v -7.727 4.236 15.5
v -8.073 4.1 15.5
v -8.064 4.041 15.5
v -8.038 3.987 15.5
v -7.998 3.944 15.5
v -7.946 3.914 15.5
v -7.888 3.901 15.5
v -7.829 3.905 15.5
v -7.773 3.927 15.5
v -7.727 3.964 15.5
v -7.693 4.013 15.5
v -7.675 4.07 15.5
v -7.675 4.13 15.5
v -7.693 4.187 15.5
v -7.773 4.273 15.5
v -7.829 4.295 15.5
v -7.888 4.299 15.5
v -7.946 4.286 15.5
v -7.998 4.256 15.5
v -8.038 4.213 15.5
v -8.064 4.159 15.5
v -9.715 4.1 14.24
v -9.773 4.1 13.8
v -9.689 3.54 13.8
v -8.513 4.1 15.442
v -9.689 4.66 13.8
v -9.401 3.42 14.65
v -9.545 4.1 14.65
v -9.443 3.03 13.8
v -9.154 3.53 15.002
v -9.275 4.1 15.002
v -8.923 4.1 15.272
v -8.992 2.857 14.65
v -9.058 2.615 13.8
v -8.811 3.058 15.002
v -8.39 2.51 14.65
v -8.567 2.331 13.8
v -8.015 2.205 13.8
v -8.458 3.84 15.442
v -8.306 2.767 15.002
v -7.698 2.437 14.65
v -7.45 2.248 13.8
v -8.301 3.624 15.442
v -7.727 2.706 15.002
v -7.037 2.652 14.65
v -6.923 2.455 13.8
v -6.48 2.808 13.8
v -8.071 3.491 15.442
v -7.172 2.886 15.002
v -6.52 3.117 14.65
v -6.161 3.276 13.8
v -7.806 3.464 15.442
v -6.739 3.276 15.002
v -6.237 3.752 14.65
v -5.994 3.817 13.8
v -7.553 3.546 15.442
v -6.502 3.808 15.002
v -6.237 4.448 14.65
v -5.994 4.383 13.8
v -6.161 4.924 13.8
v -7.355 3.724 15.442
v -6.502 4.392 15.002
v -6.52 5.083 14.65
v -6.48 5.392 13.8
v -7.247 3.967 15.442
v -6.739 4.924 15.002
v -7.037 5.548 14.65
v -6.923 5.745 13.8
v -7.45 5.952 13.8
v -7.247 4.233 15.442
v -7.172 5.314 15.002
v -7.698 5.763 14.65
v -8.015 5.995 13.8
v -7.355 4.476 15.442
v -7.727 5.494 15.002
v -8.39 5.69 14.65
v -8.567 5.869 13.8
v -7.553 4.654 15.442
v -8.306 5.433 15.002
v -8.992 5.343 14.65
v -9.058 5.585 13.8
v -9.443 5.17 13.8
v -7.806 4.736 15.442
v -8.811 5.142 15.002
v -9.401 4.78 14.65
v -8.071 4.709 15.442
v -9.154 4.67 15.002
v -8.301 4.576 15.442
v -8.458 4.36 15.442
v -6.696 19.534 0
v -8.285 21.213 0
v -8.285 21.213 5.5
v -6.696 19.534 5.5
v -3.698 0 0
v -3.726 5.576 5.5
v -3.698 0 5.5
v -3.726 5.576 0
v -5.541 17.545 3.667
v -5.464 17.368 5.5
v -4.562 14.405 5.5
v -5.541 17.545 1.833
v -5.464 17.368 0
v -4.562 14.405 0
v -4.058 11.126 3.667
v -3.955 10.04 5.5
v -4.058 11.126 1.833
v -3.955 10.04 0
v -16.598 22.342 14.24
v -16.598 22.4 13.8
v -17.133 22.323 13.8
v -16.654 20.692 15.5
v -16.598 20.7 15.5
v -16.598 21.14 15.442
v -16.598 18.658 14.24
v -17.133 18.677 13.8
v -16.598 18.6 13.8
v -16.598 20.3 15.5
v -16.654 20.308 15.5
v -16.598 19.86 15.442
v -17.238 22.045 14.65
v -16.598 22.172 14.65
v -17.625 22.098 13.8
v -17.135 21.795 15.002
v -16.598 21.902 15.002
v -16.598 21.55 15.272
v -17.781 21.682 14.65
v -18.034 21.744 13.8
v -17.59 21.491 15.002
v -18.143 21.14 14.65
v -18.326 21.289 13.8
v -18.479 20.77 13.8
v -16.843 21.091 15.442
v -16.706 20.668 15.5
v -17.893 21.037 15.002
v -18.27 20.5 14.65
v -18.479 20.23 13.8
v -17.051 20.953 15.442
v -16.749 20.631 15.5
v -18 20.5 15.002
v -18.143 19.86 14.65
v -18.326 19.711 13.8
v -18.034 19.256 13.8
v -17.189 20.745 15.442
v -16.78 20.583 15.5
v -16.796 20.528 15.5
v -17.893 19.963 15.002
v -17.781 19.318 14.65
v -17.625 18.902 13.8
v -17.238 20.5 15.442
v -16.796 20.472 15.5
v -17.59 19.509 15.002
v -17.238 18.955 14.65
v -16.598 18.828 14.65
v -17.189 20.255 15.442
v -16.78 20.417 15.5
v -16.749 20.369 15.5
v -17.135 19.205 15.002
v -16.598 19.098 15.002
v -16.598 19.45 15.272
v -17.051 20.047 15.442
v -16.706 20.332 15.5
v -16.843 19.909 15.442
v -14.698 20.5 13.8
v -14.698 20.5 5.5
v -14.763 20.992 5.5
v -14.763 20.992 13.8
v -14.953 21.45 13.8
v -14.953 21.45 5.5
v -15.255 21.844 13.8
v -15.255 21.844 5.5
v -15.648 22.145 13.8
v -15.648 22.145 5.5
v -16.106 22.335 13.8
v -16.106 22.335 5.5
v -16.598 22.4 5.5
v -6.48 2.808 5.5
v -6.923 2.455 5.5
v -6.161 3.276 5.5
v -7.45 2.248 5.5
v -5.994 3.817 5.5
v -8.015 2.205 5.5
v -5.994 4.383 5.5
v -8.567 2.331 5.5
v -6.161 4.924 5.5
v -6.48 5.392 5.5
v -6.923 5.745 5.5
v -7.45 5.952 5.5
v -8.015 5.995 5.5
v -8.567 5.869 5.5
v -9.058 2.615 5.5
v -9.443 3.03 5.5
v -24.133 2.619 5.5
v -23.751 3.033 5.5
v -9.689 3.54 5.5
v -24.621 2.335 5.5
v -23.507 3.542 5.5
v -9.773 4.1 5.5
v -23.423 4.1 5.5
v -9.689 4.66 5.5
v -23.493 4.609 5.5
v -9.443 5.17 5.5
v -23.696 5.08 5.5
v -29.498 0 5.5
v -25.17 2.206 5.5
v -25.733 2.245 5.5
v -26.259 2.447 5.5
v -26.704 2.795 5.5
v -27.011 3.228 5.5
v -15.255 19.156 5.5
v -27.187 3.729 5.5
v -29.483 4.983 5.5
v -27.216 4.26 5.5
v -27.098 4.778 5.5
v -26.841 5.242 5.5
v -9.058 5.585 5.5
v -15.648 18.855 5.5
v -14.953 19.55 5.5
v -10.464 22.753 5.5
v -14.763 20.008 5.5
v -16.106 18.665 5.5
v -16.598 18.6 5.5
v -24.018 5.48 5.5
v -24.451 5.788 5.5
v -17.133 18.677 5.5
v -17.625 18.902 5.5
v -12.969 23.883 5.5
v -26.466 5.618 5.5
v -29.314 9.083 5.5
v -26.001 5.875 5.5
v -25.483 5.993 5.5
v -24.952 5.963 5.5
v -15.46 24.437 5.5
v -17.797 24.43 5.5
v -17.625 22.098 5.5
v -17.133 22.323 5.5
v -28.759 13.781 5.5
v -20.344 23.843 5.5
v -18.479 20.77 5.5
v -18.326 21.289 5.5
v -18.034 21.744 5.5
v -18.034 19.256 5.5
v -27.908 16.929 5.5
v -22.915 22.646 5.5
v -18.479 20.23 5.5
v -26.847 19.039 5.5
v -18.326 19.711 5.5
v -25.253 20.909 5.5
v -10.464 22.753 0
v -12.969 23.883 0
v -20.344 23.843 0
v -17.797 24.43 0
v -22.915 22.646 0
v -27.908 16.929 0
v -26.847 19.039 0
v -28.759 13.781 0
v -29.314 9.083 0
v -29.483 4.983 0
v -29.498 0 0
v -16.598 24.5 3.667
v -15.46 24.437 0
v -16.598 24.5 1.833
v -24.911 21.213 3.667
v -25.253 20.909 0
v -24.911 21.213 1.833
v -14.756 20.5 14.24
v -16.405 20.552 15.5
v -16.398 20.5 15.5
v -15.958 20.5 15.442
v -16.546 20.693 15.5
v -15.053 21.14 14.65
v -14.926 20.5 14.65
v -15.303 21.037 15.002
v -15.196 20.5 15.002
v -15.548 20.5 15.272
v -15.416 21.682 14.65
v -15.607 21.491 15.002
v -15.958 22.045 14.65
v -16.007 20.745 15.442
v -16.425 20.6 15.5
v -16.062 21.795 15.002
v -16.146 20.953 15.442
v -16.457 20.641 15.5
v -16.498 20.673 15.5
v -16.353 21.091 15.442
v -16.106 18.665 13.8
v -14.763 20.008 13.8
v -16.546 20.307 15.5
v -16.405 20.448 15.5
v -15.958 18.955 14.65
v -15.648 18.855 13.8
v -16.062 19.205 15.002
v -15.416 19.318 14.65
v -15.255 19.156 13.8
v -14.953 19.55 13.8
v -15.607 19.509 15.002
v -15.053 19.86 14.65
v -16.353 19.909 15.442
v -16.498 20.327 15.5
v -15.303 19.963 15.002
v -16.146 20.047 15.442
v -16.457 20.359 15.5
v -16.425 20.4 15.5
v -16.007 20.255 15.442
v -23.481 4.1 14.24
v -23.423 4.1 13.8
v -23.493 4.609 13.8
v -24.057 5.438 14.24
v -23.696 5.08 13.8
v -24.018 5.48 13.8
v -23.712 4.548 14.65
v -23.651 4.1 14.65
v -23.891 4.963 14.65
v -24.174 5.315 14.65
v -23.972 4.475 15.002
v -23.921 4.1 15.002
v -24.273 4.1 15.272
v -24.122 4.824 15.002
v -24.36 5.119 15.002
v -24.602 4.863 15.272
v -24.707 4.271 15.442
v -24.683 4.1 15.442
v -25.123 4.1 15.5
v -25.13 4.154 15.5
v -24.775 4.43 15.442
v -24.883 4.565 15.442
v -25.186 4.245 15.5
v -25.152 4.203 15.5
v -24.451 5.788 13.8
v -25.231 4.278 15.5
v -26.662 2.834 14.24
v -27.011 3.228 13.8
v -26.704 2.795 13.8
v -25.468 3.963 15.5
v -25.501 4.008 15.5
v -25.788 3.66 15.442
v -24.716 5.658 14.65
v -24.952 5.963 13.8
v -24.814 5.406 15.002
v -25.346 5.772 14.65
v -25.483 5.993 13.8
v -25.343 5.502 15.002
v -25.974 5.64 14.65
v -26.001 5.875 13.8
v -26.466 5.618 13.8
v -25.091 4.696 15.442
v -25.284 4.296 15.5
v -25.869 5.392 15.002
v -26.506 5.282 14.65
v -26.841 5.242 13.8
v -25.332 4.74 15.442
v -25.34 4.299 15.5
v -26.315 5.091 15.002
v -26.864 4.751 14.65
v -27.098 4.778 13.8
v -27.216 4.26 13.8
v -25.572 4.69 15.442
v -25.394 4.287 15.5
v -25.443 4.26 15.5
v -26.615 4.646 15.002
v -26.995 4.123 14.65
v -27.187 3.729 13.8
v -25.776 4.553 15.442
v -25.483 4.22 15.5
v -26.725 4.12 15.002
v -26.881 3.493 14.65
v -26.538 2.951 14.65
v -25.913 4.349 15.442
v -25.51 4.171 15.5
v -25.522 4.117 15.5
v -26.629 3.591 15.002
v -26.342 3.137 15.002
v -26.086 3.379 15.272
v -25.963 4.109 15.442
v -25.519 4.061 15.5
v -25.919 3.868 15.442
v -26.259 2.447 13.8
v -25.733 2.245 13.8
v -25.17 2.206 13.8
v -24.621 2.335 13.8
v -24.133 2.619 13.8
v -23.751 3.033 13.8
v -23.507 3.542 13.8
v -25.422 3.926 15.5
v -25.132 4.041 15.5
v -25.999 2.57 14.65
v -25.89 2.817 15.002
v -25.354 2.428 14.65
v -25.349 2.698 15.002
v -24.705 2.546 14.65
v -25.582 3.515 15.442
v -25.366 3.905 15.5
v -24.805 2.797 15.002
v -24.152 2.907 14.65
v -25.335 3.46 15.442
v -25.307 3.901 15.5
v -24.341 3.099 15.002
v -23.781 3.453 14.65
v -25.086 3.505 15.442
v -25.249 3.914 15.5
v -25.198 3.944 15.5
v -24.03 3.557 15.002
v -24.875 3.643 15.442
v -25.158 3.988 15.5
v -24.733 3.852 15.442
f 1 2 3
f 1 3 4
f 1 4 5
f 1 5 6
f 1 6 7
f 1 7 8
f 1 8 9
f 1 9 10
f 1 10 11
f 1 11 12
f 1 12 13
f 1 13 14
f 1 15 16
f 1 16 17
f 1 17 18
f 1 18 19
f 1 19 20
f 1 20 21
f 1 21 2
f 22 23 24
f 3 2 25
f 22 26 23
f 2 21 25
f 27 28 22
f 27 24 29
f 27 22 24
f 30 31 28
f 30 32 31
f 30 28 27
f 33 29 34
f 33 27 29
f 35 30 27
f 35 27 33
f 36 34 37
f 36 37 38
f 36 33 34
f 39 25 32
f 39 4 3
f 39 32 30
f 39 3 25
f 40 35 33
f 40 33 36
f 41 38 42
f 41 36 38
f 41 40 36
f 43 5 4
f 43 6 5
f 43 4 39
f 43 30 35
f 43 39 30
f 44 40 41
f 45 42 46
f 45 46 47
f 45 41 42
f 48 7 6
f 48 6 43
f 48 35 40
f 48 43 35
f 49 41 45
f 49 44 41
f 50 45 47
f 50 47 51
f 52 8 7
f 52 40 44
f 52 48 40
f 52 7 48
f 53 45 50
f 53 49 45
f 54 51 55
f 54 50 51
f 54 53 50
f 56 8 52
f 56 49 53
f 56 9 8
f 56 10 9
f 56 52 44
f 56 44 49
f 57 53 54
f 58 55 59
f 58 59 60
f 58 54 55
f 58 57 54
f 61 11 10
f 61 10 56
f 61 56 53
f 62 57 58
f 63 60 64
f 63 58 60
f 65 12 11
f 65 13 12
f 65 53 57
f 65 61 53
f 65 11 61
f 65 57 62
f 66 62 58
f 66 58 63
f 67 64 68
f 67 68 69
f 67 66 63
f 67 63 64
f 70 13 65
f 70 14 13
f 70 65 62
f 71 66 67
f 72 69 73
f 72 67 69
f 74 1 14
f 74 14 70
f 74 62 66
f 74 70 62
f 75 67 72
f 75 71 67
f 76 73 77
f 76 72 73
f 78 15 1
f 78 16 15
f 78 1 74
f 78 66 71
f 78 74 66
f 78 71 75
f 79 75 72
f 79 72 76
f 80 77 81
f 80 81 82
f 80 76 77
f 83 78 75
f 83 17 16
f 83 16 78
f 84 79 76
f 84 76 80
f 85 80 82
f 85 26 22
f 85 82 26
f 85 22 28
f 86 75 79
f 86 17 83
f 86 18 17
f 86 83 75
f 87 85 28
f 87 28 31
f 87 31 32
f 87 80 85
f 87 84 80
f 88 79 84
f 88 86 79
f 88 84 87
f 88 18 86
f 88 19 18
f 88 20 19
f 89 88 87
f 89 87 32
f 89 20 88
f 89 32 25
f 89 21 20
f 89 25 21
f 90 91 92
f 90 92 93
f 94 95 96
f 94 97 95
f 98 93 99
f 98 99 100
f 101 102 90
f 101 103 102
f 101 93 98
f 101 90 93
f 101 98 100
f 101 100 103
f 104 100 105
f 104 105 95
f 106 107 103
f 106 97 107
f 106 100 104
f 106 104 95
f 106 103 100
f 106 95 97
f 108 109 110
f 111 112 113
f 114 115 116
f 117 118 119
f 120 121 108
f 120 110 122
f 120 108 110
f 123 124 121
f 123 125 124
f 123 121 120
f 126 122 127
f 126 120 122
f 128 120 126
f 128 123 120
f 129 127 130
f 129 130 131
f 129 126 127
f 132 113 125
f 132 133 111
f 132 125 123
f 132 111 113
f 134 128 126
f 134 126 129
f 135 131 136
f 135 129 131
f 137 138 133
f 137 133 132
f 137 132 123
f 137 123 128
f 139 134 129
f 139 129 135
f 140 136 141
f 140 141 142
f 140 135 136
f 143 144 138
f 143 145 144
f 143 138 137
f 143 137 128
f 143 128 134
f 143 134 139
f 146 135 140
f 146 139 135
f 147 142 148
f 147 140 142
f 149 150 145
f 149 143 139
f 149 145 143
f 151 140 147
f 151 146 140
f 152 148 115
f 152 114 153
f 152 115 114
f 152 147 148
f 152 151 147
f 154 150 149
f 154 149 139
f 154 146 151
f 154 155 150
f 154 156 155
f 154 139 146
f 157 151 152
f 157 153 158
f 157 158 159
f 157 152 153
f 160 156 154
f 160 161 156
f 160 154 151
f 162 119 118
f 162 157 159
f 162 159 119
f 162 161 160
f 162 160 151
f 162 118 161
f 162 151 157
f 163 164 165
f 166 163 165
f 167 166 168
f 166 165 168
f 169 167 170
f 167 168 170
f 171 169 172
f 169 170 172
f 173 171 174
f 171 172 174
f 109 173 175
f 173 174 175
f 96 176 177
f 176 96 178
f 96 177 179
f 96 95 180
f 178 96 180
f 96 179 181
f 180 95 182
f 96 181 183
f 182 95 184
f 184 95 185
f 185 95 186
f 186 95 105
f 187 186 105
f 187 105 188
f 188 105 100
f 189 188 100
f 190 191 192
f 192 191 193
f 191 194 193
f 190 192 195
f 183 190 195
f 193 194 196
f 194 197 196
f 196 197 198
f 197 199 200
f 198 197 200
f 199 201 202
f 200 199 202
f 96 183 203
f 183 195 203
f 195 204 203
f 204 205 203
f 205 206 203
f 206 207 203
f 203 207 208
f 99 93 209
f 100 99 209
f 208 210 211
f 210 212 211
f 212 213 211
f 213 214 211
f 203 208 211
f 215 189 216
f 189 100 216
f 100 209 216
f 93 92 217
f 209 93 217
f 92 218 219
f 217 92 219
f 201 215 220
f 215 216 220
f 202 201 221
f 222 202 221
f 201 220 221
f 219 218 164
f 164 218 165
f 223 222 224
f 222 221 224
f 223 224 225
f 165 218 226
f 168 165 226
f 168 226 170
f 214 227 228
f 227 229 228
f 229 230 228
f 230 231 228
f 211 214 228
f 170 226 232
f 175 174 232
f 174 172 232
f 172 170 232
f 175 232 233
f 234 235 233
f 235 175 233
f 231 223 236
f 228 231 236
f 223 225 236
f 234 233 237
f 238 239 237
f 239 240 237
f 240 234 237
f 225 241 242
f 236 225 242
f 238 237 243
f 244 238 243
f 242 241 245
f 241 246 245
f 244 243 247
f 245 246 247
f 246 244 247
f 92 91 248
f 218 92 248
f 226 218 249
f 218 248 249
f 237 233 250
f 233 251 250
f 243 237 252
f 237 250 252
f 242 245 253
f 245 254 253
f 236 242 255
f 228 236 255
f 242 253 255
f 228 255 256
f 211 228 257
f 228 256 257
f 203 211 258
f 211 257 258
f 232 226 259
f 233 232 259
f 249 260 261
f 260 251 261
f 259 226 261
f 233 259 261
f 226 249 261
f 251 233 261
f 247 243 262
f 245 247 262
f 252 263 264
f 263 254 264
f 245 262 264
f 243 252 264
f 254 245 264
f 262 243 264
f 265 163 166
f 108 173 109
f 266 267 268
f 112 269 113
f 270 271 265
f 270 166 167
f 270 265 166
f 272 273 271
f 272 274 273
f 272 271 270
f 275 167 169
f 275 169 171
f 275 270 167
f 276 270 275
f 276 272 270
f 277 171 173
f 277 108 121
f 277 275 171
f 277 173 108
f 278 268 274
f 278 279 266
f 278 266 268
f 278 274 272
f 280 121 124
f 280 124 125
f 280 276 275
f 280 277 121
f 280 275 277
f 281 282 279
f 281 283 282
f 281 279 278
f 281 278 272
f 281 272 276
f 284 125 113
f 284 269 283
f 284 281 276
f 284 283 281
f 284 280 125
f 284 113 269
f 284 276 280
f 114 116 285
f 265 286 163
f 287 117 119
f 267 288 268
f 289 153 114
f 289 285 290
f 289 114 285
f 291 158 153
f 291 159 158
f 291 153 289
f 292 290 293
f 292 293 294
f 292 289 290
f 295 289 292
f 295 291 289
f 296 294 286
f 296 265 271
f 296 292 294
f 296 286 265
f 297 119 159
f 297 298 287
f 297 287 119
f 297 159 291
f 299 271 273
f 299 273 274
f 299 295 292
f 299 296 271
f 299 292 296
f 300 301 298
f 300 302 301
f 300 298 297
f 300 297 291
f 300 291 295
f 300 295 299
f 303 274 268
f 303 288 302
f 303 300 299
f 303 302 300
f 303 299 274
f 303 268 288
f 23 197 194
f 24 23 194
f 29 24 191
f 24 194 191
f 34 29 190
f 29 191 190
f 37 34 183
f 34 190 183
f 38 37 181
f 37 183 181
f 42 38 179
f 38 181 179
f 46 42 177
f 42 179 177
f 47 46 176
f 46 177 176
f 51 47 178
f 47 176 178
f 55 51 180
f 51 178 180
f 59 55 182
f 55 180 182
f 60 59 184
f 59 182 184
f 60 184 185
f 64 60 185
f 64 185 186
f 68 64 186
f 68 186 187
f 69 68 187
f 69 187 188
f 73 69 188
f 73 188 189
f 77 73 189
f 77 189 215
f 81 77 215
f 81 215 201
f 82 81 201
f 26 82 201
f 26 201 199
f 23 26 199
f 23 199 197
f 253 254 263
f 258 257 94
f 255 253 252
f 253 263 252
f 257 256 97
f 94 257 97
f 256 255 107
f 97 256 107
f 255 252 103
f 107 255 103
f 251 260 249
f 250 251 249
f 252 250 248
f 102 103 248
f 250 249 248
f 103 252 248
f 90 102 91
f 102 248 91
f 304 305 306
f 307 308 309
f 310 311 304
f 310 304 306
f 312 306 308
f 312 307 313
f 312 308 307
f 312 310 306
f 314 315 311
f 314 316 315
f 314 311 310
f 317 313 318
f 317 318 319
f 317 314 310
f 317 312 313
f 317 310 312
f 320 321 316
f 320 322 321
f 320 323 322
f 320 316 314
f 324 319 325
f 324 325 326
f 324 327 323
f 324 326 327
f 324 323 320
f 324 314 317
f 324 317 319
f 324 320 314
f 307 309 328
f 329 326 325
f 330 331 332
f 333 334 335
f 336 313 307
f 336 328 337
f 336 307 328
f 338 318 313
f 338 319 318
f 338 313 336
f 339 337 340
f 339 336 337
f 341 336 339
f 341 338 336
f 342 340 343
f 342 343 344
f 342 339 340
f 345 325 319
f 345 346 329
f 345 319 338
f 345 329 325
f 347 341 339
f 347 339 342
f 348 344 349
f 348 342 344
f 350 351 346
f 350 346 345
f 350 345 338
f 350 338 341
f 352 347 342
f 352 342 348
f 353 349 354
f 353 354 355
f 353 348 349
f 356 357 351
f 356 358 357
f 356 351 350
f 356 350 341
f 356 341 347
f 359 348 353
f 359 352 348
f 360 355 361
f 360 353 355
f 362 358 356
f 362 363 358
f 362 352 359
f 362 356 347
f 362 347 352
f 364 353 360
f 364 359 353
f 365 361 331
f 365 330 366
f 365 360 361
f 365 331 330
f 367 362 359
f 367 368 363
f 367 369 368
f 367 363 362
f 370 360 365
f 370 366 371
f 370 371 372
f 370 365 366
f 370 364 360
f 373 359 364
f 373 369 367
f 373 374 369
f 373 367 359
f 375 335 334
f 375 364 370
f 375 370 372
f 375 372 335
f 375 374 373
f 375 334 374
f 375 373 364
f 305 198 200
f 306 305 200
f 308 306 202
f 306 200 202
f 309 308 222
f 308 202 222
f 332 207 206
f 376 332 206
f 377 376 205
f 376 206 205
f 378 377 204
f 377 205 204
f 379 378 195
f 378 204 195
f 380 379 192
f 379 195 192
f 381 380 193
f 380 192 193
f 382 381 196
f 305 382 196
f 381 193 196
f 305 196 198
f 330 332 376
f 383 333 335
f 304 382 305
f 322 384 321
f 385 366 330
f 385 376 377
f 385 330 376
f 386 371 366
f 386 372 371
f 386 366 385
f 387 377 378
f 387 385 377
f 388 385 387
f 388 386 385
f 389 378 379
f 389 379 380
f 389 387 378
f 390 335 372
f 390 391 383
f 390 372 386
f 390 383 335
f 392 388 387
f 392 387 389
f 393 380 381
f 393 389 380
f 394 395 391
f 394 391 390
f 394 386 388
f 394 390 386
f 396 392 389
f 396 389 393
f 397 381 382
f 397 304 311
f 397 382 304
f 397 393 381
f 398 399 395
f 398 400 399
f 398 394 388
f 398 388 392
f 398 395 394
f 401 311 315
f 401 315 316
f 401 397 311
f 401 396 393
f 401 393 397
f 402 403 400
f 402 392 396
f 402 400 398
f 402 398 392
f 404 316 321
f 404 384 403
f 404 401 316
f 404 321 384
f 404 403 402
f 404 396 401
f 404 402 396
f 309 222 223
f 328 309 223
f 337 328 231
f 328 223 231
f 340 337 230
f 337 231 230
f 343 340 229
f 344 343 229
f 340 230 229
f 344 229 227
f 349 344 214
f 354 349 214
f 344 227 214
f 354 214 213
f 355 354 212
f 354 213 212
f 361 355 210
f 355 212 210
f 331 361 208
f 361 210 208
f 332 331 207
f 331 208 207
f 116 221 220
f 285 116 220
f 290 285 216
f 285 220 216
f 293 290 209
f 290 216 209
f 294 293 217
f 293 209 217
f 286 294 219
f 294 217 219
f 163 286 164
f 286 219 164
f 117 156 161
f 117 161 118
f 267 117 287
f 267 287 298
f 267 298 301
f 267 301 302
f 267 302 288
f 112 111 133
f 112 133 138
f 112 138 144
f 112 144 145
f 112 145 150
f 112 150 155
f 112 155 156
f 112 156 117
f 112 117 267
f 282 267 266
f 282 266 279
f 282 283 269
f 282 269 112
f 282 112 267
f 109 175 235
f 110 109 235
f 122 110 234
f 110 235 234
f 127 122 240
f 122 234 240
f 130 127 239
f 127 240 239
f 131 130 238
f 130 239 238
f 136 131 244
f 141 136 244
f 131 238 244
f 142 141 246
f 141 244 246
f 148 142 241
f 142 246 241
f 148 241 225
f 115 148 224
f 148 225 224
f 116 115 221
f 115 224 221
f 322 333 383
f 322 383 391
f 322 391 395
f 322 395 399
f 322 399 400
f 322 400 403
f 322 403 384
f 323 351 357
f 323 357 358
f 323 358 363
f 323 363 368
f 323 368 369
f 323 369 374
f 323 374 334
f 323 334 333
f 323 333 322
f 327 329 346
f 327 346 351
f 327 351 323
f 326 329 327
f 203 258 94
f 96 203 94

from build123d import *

# Parameters (mm, degrees)
F1_DEPTH = 5.5
F2_DEPTH = 15.5
F3_R     = 1.7


with BuildPart() as f1:
    # F0 (on Top) → F1 (new body)
    with BuildSketch(Plane.XY):
        with BuildLine():
            add(Edge.make_bspline(
                [(-29.498119845, 0), (-29.6541738862, 14.1305088281), (-27.4827572547, 20.9253169468), (-19.6571877436, 24.5), (-16.598119845, 24.5)],
                knots=[0, 0, 0, 0, 0.3045466279, 0.5, 0.5, 0.5, 0.5], degree=3))
            Line((-29.498119845, 0), (-26.7035992752, 2.7945205698))
            ThreePointArc((-26.7035992752, 2.7945205698), (-26.6666227292, 5.4435028843), (-24.0176404147, 5.4804794302))
            Line((-24.0176404147, 5.4804794302), (-16.598119845, 12.9))
            Line((-16.598119845, 12.9), (-16.598119845, 18.6))
            ThreePointArc((-16.598119845, 18.6), (-18.498119845, 20.5), (-16.598119845, 22.4))
            Line((-16.598119845, 22.4), (-16.598119845, 24.5))
        make_face()
        with BuildLine():
            add(Edge.make_bspline(
                [(-16.598119845, 24.5), (-13.5390519463, 24.5), (-10.4799840477, 23.1026322863), (-8.2849164094, 21.2132034356)],
                knots=[0.5, 0.5, 0.5, 0.5, 0.6954533721, 0.6954533721, 0.6954533721, 0.6954533721], degree=3))
            Line((-16.598119845, 24.5), (-16.598119845, 22.4))
            ThreePointArc((-16.598119845, 22.4), (-15.2546169607, 21.8435028843), (-14.698119845, 20.5))
            ThreePointArc((-14.698119845, 20.5), (-15.2546169607, 19.1564971157), (-16.598119845, 18.6))
            Line((-16.598119845, 18.6), (-16.598119845, 12.9))
            Line((-16.598119845, 12.9), (-8.2849164094, 21.2132034356))
        make_face()
        with BuildLine():
            ThreePointArc((-14.698119845, 20.5), (-15.2546169607, 21.8435028843), (-16.598119845, 22.4))
            Line((-16.598119845, 22.4), (-16.598119845, 20.5))
            Line((-16.598119845, 20.5), (-16.598119845, 18.6))
            ThreePointArc((-16.598119845, 18.6), (-15.2546169607, 19.1564971157), (-14.698119845, 20.5))
        make_face()
        with BuildLine():
            Line((-16.598119845, 20.5), (-16.598119845, 22.4))
            ThreePointArc((-16.598119845, 22.4), (-18.498119845, 20.5), (-16.598119845, 18.6))
            Line((-16.598119845, 18.6), (-16.598119845, 20.5))
        make_face()
        with BuildLine():
            Line((-16.598119845, 4.1), (-16.598119845, 0))
            Line((-16.598119845, 0), (-3.698119845, 0))
            add(Edge.make_bspline(
                [(-8.2849164094, 21.2132034356), (-4.8646610296, 18.269180628), (-3.5420658037, 14.1305088281), (-3.698119845, 0)],
                knots=[0.6954533721, 0.6954533721, 0.6954533721, 0.6954533721, 1, 1, 1, 1], degree=3))
            Line((-8.2849164094, 21.2132034356), (-16.598119845, 12.9))
            Line((-16.598119845, 12.9), (-16.598119845, 4.1))
        make_face()
        with BuildLine():
            ThreePointArc((-5.973119845, 4.1), (-7.873119845, 2.2), (-9.773119845, 4.1))
            ThreePointArc((-9.773119845, 4.1), (-7.873119845, 6), (-5.973119845, 4.1))
        make_face(mode=Mode.SUBTRACT)
        with BuildLine():
            ThreePointArc((-5.973119845, 4.1), (-7.873119845, 6), (-9.773119845, 4.1))
            ThreePointArc((-9.773119845, 4.1), (-7.873119845, 2.2), (-5.973119845, 4.1))
        make_face()
        with BuildLine():
            Line((-23.423119845, 4.1), (-16.598119845, 4.1))
            Line((-16.598119845, 4.1), (-16.598119845, 12.9))
            Line((-16.598119845, 12.9), (-24.0176404147, 5.4804794302))
            ThreePointArc((-24.0176404147, 5.4804794302), (-23.5780681384, 4.8515281374), (-23.423119845, 4.1))
        make_face()
        with BuildLine():
            Line((-26.7035992752, 2.7945205698), (-29.498119845, 0))
            Line((-29.498119845, 0), (-16.598119845, 0))
            Line((-16.598119845, 0), (-16.598119845, 4.1))
            Line((-16.598119845, 4.1), (-23.423119845, 4.1))
            ThreePointArc((-23.423119845, 4.1), (-24.6205925919, 2.3346514625), (-26.7035992752, 2.7945205698))
        make_face()
        with BuildLine():
            Line((-24.0176404147, 5.4804794302), (-26.7035992752, 2.7945205698))
            ThreePointArc((-26.7035992752, 2.7945205698), (-24.6205925919, 2.3346514625), (-23.423119845, 4.1))
            ThreePointArc((-23.423119845, 4.1), (-23.5780681384, 4.8515281374), (-24.0176404147, 5.4804794302))
        make_face()
        with BuildLine():
            ThreePointArc((-24.0176404147, 5.4804794302), (-26.6666227292, 5.4435028843), (-26.7035992752, 2.7945205698))
            Line((-26.7035992752, 2.7945205698), (-24.0176404147, 5.4804794302))
        make_face()
    extrude(amount=F1_DEPTH)

    # F0 (on Top) → F2 (join)
    with BuildSketch(Plane.XY):
        with BuildLine():
            ThreePointArc((-24.0176404147, 5.4804794302), (-26.6666227292, 5.4435028843), (-26.7035992752, 2.7945205698))
            Line((-26.7035992752, 2.7945205698), (-24.0176404147, 5.4804794302))
        make_face()
        with BuildLine():
            Line((-24.0176404147, 5.4804794302), (-26.7035992752, 2.7945205698))
            ThreePointArc((-26.7035992752, 2.7945205698), (-24.6205925919, 2.3346514625), (-23.423119845, 4.1))
            ThreePointArc((-23.423119845, 4.1), (-23.5780681384, 4.8515281374), (-24.0176404147, 5.4804794302))
        make_face()
        with BuildLine():
            ThreePointArc((-14.698119845, 20.5), (-15.2546169607, 21.8435028843), (-16.598119845, 22.4))
            Line((-16.598119845, 22.4), (-16.598119845, 20.5))
            Line((-16.598119845, 20.5), (-16.598119845, 18.6))
            ThreePointArc((-16.598119845, 18.6), (-15.2546169607, 19.1564971157), (-14.698119845, 20.5))
        make_face()
        with BuildLine():
            Line((-16.598119845, 20.5), (-16.598119845, 22.4))
            ThreePointArc((-16.598119845, 22.4), (-18.498119845, 20.5), (-16.598119845, 18.6))
            Line((-16.598119845, 18.6), (-16.598119845, 20.5))
        make_face()
        with BuildLine():
            ThreePointArc((-5.973119845, 4.1), (-7.873119845, 6), (-9.773119845, 4.1))
            ThreePointArc((-9.773119845, 4.1), (-7.873119845, 2.2), (-5.973119845, 4.1))
        make_face()
    extrude(amount=F2_DEPTH)

    # F3
    f3_edges = [f1.edges().sort_by_distance(p)[0] for p in [
        (-16.59812, 18.6, 15.5),
        (-23.94264, 5.405479, 15.5),
        (-5.97312, 4.1, 15.5),
    ]]
    fillet(f3_edges, radius=F3_R)


solid = f1.part
